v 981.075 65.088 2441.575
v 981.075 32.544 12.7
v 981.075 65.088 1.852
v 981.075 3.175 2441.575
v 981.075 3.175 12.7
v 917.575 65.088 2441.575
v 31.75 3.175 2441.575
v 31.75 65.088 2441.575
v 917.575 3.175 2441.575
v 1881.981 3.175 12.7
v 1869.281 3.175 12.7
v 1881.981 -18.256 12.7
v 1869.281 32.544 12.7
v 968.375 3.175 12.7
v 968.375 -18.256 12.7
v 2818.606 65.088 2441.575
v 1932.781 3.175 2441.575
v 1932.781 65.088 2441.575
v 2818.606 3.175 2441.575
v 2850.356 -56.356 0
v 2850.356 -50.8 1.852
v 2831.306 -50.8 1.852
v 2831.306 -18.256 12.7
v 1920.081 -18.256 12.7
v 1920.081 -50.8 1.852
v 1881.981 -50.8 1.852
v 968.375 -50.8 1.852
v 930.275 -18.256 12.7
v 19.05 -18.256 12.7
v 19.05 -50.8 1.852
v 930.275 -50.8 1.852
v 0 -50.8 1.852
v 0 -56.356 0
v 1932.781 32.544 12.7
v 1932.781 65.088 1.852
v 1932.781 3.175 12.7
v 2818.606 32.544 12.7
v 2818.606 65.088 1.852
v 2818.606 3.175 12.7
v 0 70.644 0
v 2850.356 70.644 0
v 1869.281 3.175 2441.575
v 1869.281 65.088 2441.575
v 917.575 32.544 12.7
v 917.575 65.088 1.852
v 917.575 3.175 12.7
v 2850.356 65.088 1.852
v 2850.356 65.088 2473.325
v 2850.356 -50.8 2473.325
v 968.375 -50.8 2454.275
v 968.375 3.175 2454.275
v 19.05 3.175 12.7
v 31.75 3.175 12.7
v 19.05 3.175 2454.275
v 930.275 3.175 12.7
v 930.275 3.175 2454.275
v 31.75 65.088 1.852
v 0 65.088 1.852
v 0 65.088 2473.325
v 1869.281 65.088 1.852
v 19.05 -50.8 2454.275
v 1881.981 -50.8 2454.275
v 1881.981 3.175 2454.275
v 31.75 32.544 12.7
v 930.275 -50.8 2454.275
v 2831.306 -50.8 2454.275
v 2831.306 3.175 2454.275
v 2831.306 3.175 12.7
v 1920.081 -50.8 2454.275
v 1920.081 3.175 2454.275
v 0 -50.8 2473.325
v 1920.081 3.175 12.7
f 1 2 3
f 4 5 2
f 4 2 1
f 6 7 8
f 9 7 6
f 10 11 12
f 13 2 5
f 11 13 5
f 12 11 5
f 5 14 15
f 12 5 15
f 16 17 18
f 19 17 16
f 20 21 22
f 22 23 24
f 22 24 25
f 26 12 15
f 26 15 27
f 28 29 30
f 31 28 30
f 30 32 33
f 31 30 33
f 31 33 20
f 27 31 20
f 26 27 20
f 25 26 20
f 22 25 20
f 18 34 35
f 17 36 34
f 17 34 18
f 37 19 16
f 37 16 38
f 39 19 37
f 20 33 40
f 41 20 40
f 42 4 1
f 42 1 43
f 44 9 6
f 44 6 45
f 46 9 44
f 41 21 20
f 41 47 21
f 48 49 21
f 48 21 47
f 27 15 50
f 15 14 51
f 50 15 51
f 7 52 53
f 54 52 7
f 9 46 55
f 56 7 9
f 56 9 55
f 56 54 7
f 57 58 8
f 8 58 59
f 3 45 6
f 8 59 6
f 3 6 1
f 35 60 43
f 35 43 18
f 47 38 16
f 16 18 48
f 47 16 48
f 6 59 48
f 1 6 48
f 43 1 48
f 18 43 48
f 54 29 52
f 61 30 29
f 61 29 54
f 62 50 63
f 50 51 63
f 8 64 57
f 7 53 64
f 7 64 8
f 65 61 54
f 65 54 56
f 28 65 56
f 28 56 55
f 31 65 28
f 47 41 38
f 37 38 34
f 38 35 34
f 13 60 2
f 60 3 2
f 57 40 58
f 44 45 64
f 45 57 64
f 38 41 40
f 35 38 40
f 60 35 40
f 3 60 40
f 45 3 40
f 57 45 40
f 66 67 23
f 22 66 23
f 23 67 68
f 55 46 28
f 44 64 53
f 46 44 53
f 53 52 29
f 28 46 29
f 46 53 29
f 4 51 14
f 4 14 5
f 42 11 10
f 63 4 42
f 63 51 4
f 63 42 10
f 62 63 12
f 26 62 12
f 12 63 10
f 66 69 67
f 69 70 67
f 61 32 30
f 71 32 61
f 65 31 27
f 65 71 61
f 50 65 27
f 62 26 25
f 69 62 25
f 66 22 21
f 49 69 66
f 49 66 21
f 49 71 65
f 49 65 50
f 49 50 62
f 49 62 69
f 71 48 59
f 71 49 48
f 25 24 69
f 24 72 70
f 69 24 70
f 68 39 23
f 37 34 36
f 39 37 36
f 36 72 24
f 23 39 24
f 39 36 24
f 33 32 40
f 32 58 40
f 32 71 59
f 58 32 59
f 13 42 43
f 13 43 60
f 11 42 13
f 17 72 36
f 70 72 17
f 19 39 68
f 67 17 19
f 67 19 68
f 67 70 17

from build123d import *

# Parameters (mm, degrees)
F3_DEPTH      = 61.9125
F5_DEPTH      = 50.8
F5_DEPTH_BACK = 3.175
F7_DEPTH      = 2850.35625


with BuildPart() as f3:
    # F2 (on offset) → F3 (new body)
    with BuildSketch(Plane.XZ.offset(-3.175)):
        Polygon((0, 2454.275), (0, 0), (19.05, 0), (31.75, 0), (31.75, 2441.575), (917.575, 2441.575), (917.575, 0), (930.275, 0), (949.325, 0), (968.375, 0), (981.075, 0), (981.075, 2441.575), (1869.28125, 2441.575), (1869.28125, 0), (1881.98125, 0), (1901.03125, 0), (1920.08125, 0), (1932.78125, 0), (1932.78125, 2441.575), (2818.60625, 2441.575), (2818.60625, 0), (2831.30625, 0), (2850.35625, 0), (2850.35625, 2454.275), (2850.35625, 2473.325), (0, 2473.325), align=None)
    extrude(amount=-F3_DEPTH)

    # F4 (on Front) → F5 (join, two sides)
    with BuildSketch(Plane.XZ) as f5_sk:
        Polygon((0, 2454.275), (0, 0), (19.05, 0), (19.05, 2441.575), (19.05, 2454.275), (930.275, 2454.275), (930.275, 0), (949.325, 0), (968.375, 0), (968.375, 2454.275), (1881.98125, 2454.275), (1881.98125, 2441.575), (1881.98125, 0), (1901.03125, 0), (1920.08125, 0), (1920.08125, 2441.575), (1920.08125, 2454.275), (2831.30625, 2454.275), (2831.30625, 2441.575), (2831.30625, 0), (2850.35625, 0), (2850.35625, 2454.275), (2850.35625, 2473.325), (0, 2473.325), align=None)
    extrude(amount=F5_DEPTH)
    extrude(f5_sk.sketch, amount=-F5_DEPTH_BACK)

    # F6 (on Right) → F7 (join, through all)
    with BuildSketch(Plane.YZ):
        Polygon((7.14375, 0), (65.0875, 0), (70.64375, 0), (32.54375, 12.7), (-18.25625, 12.7), (-56.35625, 0), (-50.8, 0), align=None)
    extrude(amount=F7_DEPTH)


solid = f3.part
